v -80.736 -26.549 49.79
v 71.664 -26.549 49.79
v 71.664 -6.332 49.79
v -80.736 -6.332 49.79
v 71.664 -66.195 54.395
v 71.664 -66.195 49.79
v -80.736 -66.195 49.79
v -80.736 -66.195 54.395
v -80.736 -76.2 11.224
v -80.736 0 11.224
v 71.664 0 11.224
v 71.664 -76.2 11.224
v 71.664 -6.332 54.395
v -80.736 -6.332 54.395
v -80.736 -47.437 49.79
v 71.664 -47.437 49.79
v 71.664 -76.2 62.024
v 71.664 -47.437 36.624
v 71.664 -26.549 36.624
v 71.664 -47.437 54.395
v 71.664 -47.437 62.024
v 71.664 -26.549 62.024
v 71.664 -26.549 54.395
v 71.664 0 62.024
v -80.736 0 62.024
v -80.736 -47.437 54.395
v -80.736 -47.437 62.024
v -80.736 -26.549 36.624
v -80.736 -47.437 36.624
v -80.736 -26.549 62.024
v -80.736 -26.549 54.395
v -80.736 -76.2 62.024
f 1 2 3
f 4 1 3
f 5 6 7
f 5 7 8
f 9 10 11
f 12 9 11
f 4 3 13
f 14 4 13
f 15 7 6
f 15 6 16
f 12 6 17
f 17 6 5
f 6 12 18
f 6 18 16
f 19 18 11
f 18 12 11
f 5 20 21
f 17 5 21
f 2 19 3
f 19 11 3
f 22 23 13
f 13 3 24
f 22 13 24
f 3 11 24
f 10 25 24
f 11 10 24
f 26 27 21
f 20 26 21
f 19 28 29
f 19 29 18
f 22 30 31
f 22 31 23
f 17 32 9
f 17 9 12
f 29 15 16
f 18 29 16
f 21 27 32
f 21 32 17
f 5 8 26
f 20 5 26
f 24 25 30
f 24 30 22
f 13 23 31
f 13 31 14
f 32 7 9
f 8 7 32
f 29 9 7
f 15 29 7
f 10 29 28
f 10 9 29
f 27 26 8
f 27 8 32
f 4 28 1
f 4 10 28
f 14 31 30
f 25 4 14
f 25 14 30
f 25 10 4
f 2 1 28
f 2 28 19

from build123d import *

# Parameters (mm, degrees)
F0_W     = 152.4
F0_H     = 50.8
F1_DEPTH = 76.2
F2_W     = 59.863596
F2_H     = 4.604891
F3_DEPTH = 152.4
F4_W     = 152.4
F4_H     = 20.887783
F5_DEPTH = 25.4


with BuildPart() as f1:
    # F0 (on Front) → F1 (new body)
    with BuildSketch(Plane.XZ):
        with Locations((-4.536367, 36.624424)):
            Rectangle(F0_W, F0_H)
    extrude(amount=F1_DEPTH)

    # F2 (on face) → F3 (cut, through all)
    with BuildSketch(Plane.YZ.offset(71.663633)):
        with Locations((-36.263526, 52.092843)):
            Rectangle(F2_W, F2_H)
    extrude(amount=-F3_DEPTH, mode=Mode.SUBTRACT)

    # F4 (on face) → F5 (cut)
    with BuildSketch(Plane.XY.offset(62.024424)):
        with Locations((-4.536367, -36.993027)):
            Rectangle(F4_W, F4_H)
    extrude(amount=-F5_DEPTH, mode=Mode.SUBTRACT)


solid = f1.part
